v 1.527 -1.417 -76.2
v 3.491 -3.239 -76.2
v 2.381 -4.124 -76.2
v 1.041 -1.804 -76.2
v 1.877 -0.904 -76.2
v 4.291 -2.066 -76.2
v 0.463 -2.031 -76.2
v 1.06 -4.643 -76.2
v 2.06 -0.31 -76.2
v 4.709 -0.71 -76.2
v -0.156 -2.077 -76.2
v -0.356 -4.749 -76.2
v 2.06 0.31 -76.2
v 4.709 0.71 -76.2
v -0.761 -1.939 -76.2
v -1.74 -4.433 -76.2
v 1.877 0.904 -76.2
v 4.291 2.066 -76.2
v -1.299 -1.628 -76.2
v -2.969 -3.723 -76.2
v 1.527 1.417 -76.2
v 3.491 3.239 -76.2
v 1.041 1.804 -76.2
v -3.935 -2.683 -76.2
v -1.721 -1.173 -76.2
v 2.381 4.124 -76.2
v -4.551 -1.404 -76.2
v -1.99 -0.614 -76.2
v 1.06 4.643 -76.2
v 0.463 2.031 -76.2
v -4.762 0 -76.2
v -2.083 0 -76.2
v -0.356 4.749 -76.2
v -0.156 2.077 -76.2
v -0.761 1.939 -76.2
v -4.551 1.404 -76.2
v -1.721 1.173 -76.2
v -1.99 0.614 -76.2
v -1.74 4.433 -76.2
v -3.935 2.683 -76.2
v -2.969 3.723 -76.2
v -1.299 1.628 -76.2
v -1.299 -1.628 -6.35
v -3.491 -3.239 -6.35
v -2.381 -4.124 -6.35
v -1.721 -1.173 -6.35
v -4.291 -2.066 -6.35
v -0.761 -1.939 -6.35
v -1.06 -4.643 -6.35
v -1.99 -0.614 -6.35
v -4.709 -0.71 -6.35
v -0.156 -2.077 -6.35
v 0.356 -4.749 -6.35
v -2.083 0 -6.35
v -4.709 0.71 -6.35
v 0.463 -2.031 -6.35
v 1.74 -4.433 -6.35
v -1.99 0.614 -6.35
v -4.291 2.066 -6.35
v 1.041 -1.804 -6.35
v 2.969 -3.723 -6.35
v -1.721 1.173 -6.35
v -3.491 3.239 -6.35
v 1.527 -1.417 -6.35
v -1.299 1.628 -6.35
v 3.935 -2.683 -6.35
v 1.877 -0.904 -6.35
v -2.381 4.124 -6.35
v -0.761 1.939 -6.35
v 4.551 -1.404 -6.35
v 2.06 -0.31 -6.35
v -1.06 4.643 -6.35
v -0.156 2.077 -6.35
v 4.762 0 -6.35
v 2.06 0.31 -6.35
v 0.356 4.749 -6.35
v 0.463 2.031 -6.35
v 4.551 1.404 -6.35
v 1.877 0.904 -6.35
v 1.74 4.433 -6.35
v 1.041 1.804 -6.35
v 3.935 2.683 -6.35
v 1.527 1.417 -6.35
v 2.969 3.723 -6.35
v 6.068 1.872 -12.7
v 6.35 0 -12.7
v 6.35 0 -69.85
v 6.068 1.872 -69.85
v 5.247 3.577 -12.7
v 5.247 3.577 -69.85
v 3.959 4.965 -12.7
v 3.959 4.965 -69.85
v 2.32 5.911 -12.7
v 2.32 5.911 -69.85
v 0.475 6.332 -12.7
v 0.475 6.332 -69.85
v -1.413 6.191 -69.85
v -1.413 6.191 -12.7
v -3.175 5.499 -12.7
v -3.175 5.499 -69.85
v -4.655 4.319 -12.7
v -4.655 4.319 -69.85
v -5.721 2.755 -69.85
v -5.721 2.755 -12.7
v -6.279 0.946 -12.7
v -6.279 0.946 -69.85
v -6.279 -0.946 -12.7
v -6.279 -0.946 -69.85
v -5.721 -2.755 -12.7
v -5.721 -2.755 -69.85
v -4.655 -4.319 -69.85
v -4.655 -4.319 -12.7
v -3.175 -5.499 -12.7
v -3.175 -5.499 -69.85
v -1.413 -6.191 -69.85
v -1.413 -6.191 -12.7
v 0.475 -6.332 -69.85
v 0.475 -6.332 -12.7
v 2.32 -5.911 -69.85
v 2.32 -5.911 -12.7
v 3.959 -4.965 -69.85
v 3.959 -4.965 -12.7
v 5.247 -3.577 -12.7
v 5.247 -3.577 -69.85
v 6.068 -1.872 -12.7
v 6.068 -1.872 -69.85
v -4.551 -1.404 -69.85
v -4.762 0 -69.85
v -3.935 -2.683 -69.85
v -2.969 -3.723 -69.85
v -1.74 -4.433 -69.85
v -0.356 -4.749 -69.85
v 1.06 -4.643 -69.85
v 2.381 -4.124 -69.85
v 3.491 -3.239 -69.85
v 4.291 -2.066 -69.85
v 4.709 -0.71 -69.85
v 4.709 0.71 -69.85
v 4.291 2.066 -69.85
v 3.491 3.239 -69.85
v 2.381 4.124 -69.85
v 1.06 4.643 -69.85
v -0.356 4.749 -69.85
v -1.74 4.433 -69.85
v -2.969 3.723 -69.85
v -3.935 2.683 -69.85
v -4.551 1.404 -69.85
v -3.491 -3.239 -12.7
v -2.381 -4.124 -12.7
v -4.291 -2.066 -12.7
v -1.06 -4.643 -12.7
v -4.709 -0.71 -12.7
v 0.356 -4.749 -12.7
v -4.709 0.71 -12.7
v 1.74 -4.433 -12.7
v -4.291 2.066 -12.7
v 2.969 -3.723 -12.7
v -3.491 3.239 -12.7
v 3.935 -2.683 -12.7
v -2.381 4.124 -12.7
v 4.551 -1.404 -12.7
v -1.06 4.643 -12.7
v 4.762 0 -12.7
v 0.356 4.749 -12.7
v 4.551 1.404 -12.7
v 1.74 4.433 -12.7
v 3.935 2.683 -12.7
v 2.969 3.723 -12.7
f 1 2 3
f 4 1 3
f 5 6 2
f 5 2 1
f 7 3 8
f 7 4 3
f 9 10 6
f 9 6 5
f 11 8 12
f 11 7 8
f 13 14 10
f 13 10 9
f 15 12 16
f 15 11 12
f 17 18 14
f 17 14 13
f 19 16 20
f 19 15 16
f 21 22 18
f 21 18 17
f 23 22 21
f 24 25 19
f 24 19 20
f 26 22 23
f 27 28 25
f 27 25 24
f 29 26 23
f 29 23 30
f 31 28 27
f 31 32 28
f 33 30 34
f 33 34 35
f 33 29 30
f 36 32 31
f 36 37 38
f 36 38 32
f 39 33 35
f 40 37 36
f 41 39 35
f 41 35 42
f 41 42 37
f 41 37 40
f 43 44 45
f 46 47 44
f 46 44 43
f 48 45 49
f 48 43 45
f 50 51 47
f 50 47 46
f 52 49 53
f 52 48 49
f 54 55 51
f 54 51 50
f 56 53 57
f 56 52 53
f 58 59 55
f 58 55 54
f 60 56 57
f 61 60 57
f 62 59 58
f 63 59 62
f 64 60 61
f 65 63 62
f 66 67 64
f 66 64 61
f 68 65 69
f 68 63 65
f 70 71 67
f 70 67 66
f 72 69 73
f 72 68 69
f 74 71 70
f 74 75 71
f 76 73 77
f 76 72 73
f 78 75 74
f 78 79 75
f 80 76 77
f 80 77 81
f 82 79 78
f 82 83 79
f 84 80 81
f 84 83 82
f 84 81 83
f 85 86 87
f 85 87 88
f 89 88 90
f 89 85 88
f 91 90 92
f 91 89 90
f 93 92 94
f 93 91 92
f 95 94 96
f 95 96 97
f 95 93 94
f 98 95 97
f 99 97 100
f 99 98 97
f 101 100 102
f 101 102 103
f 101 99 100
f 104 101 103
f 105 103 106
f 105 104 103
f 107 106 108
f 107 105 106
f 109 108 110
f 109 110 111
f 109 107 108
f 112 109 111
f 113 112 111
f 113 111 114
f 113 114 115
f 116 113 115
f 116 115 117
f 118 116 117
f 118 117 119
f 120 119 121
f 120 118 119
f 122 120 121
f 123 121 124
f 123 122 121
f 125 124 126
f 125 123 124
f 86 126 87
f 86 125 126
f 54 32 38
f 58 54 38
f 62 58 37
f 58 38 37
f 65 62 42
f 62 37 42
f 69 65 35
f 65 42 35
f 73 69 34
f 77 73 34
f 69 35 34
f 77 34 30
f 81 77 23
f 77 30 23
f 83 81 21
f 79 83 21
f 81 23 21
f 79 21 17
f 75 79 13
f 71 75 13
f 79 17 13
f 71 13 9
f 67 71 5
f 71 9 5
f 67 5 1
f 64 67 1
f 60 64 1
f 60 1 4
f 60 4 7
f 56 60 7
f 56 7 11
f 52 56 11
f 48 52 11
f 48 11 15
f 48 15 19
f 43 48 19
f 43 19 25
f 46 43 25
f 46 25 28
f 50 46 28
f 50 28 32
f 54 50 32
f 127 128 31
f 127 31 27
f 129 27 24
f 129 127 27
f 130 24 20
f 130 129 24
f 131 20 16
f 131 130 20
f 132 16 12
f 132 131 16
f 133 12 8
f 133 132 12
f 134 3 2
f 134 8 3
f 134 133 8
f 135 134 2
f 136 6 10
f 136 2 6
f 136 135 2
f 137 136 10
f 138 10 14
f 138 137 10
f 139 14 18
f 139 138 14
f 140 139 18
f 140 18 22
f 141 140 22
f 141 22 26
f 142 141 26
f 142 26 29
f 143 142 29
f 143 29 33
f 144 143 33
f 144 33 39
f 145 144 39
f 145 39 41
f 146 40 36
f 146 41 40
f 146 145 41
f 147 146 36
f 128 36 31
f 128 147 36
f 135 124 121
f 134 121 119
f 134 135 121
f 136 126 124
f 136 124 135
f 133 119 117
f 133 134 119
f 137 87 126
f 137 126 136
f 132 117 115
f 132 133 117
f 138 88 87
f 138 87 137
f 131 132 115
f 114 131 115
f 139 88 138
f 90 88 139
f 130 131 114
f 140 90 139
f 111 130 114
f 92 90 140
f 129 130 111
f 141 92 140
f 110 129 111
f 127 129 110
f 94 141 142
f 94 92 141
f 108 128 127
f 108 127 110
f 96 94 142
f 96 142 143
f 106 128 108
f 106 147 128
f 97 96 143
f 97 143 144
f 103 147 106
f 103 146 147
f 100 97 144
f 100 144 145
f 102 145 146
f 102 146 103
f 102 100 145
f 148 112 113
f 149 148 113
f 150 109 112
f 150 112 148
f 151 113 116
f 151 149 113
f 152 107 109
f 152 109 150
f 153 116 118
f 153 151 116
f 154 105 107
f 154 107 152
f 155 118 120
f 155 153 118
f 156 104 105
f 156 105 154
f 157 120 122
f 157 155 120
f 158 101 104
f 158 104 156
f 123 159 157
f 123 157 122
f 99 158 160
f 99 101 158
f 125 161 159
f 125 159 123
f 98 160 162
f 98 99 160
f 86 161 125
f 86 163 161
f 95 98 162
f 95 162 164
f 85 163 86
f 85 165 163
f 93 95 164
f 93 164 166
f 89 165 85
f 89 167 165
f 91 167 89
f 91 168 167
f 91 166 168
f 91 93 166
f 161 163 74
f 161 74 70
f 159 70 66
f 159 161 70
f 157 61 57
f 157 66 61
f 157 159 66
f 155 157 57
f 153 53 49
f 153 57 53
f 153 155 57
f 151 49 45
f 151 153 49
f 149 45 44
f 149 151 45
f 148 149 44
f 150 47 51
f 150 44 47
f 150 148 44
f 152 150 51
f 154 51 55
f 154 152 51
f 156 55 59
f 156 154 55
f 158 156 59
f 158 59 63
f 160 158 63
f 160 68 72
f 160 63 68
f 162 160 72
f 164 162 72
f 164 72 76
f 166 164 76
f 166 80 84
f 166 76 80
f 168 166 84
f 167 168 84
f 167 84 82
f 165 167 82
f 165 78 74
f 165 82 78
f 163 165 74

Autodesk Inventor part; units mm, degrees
ref_plane "YZ Plane" through (0, 0, 0) normal (1, 0, 0) x (0, 1, 0)
sketch "Sketch1" plane through (0, 0, 0) normal (0, 0, 1) x (1, 0, 0)
  circle A0 centre (0, 0) radius 6.35
  dimension "d0" = 12.7
extrude "Extrusion1" add sketch "Sketch1" against normal blind 82.55
ref_plane "Work Plane4" through (0, 0, -12.7) normal (0, 0, 1) x (1, 0, 0)
sketch "Sketch4" plane through (0, 0, -12.7) normal (0, 0, 1) x (1, 0, 0)
  circle A0 centre (0, 0) radius 6.35 projected
  circle A1 centre (0, 0) radius 4.7625
  circle A2 centre (0, 0) radius 1.7272
  dimension "d27" = 9.525
  dimension "d36" = 3.4544
ref_plane "Work Plane5" through (0, 0, -69.85) normal (0, 0, -1) x (-1, 0, 0)
sketch "Sketch5" plane through (0, 0, -69.85) normal (0, 0, -1) x (-1, 0, 0)
  circle A0 centre (0, 0) radius 6.35 projected
  circle A1 centre (0, 0) radius 4.7625
  circle A2 centre (0, 0) radius 2.0828
  dimension "d24" = 9.525
  dimension "d35" = 4.1656
extrude "Extrusion6" cut sketch "Sketch5" along normal blind 25.4 contours A0 | A1 | A2
extrude "Extrusion7" cut sketch "Sketch4" along normal blind 25.4 contours A0 | A1 | A2
extrude "Extrusion8" add sketch "Sketch4" along normal blind 6.35 contours A1 | A2
extrude "Extrusion9" add sketch "Sketch5" along normal blind 6.35 contours A1 | A2
extrude "Extrusion10" cut sketch "Sketch5" along normal through all both and the other way through all contours A2
thread "Thread6" size "8-32 UNC" class "2B" standard "ANSI Unified Screw Threads" full length
properties part number "lower box weel shaft steel"
